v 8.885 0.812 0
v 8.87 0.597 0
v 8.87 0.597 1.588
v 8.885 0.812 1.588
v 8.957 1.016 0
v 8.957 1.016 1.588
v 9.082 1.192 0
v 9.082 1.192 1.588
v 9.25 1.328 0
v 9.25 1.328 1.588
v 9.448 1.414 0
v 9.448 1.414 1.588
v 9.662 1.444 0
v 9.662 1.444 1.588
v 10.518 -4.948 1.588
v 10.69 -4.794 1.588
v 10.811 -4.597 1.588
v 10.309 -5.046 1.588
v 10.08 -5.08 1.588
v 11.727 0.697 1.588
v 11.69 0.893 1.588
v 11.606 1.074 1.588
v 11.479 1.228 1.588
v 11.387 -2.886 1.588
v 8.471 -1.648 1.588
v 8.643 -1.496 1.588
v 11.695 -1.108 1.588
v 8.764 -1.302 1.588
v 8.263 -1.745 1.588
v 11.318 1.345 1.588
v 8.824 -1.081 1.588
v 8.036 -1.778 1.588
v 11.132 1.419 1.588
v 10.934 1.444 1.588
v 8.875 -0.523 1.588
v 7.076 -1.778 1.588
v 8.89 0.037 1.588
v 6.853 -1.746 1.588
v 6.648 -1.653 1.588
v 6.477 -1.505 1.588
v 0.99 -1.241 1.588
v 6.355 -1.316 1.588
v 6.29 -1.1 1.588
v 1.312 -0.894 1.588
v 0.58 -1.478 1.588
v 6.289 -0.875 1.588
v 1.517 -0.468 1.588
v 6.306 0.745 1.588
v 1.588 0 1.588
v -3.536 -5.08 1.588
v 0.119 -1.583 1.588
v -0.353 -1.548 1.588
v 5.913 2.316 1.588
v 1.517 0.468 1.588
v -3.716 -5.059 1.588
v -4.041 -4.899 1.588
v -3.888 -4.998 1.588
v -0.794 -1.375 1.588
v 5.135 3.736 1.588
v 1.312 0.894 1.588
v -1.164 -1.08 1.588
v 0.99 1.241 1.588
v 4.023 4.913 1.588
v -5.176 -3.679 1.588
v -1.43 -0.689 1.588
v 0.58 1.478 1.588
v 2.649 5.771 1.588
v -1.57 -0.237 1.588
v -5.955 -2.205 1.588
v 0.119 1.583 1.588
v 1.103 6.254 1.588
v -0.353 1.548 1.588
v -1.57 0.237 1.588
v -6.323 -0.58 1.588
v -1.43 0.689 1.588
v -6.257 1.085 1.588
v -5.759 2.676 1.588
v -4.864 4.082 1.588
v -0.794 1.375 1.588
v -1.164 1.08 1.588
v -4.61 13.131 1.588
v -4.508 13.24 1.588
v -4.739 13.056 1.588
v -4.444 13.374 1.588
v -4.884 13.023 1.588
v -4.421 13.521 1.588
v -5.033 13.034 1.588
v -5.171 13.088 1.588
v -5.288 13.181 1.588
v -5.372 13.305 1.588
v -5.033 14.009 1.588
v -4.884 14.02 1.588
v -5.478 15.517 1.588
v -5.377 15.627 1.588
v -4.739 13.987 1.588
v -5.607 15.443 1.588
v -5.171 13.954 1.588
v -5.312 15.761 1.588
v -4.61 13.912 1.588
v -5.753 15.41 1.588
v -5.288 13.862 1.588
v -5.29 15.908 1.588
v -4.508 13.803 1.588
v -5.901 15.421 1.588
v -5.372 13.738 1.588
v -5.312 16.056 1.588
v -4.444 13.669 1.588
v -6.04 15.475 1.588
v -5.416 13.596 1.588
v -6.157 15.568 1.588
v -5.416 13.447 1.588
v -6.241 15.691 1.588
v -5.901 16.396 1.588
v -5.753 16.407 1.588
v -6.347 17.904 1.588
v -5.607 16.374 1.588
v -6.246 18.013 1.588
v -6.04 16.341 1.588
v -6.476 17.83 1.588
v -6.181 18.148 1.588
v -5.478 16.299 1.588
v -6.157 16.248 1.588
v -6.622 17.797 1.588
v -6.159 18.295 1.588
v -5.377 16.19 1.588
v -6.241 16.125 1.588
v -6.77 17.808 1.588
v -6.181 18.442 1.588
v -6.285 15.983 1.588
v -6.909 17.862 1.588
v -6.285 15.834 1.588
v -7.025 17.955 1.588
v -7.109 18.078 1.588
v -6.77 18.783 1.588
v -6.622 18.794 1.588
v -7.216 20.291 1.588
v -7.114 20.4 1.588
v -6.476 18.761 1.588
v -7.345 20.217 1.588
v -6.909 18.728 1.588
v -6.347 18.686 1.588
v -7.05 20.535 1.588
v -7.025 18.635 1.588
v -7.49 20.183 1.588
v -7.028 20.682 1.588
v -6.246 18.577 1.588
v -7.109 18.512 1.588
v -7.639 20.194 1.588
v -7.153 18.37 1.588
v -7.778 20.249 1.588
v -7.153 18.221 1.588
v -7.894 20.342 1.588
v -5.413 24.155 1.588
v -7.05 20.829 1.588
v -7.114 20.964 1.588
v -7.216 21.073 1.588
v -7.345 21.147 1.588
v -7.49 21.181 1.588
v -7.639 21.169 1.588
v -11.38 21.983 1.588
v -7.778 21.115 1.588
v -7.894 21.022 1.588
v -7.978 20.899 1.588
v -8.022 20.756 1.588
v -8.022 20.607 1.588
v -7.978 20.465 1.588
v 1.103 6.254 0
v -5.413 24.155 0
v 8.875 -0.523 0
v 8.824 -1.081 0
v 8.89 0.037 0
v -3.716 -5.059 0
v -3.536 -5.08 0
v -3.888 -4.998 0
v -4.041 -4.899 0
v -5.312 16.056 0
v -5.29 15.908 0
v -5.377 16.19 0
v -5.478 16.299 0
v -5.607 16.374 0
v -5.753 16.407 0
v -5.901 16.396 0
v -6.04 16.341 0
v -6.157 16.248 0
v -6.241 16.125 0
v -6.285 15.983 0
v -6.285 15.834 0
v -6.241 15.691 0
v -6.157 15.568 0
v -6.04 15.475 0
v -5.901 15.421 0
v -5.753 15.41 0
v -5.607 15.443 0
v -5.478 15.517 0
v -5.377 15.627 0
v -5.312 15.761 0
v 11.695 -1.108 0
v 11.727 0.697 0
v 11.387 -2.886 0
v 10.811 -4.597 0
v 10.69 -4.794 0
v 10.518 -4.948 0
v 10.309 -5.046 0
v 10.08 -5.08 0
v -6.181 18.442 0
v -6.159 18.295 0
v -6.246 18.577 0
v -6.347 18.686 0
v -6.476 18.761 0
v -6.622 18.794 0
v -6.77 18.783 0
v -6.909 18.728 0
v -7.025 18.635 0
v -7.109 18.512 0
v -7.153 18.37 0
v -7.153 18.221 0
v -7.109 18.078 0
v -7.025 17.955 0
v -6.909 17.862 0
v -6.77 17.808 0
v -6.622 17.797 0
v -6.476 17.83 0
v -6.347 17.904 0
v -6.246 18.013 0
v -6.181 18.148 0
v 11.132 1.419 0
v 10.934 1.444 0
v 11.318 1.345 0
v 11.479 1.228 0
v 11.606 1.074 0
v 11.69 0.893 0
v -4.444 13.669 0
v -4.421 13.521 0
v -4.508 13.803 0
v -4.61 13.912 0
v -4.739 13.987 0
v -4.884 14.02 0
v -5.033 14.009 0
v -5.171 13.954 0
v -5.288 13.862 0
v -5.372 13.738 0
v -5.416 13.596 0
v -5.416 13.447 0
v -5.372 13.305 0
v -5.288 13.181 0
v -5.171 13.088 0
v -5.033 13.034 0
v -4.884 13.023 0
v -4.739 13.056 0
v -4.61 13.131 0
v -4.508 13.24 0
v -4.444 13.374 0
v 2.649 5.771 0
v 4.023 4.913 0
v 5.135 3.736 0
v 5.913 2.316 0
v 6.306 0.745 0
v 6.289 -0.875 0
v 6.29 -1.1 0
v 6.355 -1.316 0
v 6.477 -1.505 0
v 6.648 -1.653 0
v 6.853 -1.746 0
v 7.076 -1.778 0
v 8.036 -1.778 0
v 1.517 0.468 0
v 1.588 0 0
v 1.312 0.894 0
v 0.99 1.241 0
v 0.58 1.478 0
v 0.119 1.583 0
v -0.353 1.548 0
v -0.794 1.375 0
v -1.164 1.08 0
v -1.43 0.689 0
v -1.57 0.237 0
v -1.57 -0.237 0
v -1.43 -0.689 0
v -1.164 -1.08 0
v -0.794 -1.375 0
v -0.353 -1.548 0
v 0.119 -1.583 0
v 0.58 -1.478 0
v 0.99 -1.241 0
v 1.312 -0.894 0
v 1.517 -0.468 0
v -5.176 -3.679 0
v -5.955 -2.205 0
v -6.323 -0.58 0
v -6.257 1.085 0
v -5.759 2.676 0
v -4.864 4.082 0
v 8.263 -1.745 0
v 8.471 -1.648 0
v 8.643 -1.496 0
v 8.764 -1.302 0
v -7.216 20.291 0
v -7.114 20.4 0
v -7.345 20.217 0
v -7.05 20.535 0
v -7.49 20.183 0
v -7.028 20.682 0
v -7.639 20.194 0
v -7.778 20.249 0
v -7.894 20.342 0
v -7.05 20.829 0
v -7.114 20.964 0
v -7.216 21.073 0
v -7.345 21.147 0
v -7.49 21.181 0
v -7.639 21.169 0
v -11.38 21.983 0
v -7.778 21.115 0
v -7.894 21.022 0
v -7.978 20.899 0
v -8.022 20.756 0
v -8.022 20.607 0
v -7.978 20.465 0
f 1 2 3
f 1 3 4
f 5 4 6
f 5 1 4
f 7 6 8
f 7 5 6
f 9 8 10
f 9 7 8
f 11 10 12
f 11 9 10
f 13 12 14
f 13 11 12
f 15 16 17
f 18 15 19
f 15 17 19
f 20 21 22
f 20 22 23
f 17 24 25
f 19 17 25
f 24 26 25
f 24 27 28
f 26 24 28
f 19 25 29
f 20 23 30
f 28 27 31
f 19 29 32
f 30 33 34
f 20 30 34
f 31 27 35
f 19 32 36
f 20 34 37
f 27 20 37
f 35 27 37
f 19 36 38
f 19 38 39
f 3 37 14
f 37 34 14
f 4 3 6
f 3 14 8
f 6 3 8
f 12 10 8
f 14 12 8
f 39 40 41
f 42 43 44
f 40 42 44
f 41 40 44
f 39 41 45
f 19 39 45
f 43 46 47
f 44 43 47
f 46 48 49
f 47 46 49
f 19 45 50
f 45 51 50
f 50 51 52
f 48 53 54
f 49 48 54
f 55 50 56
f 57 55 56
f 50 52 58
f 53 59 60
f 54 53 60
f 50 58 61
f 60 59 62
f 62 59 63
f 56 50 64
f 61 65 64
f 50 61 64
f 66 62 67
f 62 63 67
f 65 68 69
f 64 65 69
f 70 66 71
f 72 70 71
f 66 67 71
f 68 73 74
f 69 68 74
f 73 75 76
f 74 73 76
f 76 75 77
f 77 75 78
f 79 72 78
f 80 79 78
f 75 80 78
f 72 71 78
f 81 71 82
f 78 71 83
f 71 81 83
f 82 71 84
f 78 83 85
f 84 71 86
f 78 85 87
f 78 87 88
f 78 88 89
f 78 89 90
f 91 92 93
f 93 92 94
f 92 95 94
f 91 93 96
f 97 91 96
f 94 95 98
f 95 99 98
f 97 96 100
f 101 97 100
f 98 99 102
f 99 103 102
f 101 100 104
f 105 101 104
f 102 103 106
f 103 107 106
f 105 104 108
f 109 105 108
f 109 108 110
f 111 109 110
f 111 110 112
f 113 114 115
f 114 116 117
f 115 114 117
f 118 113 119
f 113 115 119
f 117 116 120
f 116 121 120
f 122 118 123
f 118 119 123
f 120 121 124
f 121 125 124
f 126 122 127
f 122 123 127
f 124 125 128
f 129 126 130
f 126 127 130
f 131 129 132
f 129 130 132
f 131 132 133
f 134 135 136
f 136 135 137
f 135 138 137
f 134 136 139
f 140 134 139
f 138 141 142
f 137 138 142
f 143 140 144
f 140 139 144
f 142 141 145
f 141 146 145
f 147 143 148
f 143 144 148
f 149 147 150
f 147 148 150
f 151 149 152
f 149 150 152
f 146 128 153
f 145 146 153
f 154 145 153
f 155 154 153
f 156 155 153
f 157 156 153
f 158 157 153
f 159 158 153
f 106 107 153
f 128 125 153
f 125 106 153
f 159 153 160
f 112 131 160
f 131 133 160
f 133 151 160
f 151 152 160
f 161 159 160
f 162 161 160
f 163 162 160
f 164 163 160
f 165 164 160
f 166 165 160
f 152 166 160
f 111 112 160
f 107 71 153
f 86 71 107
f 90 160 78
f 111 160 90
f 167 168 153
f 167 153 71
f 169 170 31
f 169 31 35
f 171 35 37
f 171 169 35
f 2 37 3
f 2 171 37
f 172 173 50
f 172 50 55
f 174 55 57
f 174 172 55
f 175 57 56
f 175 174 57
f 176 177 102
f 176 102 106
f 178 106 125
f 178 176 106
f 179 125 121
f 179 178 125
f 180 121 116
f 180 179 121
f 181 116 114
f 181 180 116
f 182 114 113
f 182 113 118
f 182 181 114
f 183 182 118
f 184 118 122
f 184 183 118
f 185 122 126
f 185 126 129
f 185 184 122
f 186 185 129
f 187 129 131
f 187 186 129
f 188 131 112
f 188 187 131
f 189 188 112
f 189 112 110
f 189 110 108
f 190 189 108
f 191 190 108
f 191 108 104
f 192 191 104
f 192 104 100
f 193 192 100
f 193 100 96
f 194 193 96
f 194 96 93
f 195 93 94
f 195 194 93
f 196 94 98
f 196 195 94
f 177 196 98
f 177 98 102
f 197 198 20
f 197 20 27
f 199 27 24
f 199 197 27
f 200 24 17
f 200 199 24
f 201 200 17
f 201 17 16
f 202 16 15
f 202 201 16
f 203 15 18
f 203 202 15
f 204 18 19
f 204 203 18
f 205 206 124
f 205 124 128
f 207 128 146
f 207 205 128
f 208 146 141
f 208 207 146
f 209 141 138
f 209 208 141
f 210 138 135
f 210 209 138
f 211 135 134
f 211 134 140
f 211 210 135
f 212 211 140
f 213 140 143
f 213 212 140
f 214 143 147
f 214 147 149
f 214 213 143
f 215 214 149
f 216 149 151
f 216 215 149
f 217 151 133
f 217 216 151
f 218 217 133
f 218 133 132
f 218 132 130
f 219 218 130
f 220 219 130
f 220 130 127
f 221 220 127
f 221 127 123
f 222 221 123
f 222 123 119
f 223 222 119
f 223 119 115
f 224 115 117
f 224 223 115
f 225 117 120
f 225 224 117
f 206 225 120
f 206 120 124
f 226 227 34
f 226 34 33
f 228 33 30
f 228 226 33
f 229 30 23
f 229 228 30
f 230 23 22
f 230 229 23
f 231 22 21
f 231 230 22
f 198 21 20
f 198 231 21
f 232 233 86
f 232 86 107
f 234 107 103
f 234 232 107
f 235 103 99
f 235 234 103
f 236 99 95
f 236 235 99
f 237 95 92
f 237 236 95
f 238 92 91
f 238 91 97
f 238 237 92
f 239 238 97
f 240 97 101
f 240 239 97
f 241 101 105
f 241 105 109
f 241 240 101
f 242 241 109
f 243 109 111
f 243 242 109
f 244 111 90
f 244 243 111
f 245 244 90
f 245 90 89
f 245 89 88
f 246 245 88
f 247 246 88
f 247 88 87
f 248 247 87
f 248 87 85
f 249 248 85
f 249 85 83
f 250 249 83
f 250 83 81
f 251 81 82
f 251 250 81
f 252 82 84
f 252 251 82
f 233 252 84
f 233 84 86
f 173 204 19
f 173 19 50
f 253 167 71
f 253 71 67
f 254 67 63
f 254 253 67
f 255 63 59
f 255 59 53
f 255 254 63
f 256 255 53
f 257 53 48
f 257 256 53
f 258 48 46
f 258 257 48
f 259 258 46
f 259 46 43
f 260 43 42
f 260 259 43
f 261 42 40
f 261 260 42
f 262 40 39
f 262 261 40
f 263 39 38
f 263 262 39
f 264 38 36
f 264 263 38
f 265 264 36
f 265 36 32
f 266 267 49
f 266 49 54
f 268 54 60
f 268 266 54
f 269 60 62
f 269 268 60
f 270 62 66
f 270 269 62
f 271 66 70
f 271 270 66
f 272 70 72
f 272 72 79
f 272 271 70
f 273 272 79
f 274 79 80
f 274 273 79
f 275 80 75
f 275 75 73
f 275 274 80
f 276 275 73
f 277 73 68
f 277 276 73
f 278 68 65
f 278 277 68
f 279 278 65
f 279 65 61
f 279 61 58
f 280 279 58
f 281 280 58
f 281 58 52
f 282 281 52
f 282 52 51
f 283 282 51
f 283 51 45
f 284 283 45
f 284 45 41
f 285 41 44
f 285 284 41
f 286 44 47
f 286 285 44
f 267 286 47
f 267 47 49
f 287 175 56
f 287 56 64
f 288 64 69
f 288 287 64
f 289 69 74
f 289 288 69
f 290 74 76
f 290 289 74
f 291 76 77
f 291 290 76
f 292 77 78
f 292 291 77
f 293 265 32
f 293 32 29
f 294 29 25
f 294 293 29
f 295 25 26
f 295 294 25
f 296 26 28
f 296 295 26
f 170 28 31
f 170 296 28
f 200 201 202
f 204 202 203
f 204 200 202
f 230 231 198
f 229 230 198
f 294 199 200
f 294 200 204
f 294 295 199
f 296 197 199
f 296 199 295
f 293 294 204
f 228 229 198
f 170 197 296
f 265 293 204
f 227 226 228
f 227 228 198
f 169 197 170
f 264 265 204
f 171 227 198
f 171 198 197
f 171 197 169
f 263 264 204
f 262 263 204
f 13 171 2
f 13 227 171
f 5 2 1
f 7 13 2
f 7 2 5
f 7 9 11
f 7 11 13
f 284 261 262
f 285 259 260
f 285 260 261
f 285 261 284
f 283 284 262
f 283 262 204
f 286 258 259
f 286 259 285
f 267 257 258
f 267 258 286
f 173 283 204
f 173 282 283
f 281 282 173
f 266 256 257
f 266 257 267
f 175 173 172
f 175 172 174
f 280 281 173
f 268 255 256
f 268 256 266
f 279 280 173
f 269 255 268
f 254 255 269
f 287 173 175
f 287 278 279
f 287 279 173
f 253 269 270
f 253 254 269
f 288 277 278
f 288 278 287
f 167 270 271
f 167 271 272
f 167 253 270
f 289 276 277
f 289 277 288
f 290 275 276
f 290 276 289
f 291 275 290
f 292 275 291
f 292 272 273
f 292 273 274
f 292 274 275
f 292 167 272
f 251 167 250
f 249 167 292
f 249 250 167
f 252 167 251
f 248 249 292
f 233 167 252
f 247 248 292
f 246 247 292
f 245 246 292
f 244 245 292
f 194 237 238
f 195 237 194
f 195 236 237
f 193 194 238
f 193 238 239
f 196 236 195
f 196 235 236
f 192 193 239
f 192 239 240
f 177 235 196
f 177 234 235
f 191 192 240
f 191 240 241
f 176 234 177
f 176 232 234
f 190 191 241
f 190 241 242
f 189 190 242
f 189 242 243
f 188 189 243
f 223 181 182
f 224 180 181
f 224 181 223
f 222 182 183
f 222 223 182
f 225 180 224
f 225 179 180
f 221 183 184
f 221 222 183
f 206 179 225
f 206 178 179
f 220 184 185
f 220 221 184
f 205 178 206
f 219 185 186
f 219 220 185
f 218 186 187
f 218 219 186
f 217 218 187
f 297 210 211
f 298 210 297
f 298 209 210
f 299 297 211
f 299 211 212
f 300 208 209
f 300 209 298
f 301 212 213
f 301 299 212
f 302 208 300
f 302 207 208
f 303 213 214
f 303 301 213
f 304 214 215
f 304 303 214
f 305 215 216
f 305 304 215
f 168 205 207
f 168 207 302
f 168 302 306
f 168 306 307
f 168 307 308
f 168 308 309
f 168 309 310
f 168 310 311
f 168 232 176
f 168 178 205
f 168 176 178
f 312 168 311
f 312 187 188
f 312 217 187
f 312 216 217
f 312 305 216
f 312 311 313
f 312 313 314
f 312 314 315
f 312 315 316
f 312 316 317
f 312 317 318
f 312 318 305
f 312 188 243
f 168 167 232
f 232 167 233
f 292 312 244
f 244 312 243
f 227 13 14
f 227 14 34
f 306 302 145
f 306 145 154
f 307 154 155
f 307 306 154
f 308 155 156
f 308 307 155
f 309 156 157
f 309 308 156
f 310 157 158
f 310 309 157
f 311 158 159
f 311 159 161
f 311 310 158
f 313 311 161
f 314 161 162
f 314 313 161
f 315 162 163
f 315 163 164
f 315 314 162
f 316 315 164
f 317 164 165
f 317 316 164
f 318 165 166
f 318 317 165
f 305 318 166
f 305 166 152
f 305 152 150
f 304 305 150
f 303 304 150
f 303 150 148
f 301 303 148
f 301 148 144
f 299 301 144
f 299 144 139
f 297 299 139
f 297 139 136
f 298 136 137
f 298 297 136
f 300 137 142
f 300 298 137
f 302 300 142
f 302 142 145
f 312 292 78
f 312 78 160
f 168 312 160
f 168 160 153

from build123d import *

# Parameters (mm, degrees)
SKETCH1_R           = 1.5875
SKETCH1_R_2         = 0.5
BOSS_EXTRUDE1_DEPTH = 1.5875


with BuildPart() as part:
    # Sketch1 → Boss-Extrude1 (new body)
    with BuildSketch(Plane.XY):
        with BuildLine():
            Line((-11.379865944, 21.982845747), (-5.412817802, 24.154673658))
            Line((-5.412817802, 24.154673658), (1.102665928, 6.253529232))
            ThreePointArc((1.102665928, 6.253529232), (5.134627331, 3.736054359), (6.289441106, -0.874888889))
            ThreePointArc((6.289441106, -0.874888889), (6.476937503, -1.505418725), (7.075621245, -1.778))
            Line((7.075621245, -1.778), (8.036200346, -1.778))
            ThreePointArc((8.036200346, -1.778), (8.562245058, -1.578653923), (8.824063125, -1.080745098))
            ThreePointArc((8.824063125, -1.080745098), (8.886673646, -0.243169696), (8.869960358, 0.596576276))
            ThreePointArc((8.869960358, 0.596576276), (9.082128579, 1.191948731), (9.661921104, 1.443592015))
            Line((9.661921104, 1.443592015), (10.93445675, 1.443592015))
            ThreePointArc((10.93445675, 1.443592015), (11.478819393, 1.227516989), (11.726808688, 0.696932016))
            ThreePointArc((11.726808688, 0.696932016), (11.575475742, -2.003027106), (10.810769922, -4.596847826))
            ThreePointArc((10.810769922, -4.596847826), (10.51820634, -4.948283265), (10.080312495, -5.08))
            Line((10.080312495, -5.08), (-3.53553037, -5.08))
            ThreePointArc((-3.53553037, -5.08), (-3.803866846, -5.033267134), (-4.040606138, -4.898571429))
            ThreePointArc((-4.040606138, -4.898571429), (-6.323450723, -0.58006116), (-4.864382214, 4.081701322))
            Line((-4.864382214, 4.081701322), (-11.379865944, 21.982845747))
        make_face()
        Circle(SKETCH1_R, mode=Mode.SUBTRACT)
        with Locations((-7.527610709, 20.681940446)):
            Circle(SKETCH1_R_2, mode=Mode.SUBTRACT)
        with Locations((-6.658879545, 18.295121189)):
            Circle(SKETCH1_R_2, mode=Mode.SUBTRACT)
        with Locations((-5.790148381, 15.908301932)):
            Circle(SKETCH1_R_2, mode=Mode.SUBTRACT)
        with Locations((-4.921417217, 13.521482675)):
            Circle(SKETCH1_R_2, mode=Mode.SUBTRACT)
    extrude(amount=BOSS_EXTRUDE1_DEPTH)


solid = part.part
